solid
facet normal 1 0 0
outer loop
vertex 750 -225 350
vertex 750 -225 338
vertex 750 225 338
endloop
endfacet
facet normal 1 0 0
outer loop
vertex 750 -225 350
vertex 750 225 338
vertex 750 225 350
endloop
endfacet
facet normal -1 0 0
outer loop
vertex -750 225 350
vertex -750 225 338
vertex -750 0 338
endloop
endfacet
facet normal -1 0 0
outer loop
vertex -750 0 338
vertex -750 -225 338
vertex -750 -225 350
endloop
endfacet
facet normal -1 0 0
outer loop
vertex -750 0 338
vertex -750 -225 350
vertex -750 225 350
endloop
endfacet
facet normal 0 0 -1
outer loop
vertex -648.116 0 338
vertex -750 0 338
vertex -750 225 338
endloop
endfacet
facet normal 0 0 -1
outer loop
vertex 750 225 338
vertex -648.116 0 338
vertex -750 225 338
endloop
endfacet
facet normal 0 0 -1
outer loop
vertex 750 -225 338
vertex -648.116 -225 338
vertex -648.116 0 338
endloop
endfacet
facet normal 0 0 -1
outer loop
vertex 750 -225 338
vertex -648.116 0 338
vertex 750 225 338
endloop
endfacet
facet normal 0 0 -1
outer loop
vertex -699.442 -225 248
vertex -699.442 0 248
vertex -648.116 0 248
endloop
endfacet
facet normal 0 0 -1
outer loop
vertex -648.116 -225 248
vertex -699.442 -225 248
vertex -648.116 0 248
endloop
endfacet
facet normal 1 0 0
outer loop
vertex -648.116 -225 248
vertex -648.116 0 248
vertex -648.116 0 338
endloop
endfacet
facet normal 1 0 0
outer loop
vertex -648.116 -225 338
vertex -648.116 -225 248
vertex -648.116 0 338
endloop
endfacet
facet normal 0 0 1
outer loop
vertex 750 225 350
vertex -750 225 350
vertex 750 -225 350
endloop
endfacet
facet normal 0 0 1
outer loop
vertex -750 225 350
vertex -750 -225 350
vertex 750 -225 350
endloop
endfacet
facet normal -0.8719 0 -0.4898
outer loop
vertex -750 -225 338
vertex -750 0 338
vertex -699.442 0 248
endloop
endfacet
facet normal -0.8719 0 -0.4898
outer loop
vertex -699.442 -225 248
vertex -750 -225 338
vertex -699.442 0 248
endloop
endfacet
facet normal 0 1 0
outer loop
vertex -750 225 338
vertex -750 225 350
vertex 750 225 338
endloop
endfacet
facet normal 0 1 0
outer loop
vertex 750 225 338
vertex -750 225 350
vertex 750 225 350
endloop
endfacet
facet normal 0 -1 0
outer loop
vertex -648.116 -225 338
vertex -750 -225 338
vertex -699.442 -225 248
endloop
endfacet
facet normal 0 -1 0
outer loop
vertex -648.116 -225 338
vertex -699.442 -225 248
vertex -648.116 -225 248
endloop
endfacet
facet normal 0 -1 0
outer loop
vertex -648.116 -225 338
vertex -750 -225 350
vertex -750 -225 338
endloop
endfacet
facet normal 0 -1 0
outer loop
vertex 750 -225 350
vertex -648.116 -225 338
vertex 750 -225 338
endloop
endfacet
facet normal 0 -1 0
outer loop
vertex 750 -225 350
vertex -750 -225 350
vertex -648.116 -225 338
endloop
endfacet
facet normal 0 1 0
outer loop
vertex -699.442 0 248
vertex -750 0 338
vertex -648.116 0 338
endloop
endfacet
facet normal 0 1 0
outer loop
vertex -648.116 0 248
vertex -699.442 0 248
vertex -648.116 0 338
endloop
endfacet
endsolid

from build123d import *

# Parameters (mm, degrees)
F1_W     = 1500
F1_H     = 12
F2_DEPTH = 225
F4_DEPTH = 225


with BuildPart() as f2:
    # F1 (on Front) → F2 (new body, symmetric)
    with BuildSketch(Plane.XZ):
        with Locations((0, 344)):
            Rectangle(F1_W, F1_H)
    extrude(amount=F2_DEPTH, both=True)

    # F3 (on face) → F4 (join, through all)
    with BuildSketch(Plane.XZ):
        Polygon((-648.1164097786, 338), (-750, 338), (-699.4419693947, 248), (-648.1164097786, 248), (-648.1164097786, 282.9072217941), align=None)
    extrude(amount=F4_DEPTH)


solid = f2.part
